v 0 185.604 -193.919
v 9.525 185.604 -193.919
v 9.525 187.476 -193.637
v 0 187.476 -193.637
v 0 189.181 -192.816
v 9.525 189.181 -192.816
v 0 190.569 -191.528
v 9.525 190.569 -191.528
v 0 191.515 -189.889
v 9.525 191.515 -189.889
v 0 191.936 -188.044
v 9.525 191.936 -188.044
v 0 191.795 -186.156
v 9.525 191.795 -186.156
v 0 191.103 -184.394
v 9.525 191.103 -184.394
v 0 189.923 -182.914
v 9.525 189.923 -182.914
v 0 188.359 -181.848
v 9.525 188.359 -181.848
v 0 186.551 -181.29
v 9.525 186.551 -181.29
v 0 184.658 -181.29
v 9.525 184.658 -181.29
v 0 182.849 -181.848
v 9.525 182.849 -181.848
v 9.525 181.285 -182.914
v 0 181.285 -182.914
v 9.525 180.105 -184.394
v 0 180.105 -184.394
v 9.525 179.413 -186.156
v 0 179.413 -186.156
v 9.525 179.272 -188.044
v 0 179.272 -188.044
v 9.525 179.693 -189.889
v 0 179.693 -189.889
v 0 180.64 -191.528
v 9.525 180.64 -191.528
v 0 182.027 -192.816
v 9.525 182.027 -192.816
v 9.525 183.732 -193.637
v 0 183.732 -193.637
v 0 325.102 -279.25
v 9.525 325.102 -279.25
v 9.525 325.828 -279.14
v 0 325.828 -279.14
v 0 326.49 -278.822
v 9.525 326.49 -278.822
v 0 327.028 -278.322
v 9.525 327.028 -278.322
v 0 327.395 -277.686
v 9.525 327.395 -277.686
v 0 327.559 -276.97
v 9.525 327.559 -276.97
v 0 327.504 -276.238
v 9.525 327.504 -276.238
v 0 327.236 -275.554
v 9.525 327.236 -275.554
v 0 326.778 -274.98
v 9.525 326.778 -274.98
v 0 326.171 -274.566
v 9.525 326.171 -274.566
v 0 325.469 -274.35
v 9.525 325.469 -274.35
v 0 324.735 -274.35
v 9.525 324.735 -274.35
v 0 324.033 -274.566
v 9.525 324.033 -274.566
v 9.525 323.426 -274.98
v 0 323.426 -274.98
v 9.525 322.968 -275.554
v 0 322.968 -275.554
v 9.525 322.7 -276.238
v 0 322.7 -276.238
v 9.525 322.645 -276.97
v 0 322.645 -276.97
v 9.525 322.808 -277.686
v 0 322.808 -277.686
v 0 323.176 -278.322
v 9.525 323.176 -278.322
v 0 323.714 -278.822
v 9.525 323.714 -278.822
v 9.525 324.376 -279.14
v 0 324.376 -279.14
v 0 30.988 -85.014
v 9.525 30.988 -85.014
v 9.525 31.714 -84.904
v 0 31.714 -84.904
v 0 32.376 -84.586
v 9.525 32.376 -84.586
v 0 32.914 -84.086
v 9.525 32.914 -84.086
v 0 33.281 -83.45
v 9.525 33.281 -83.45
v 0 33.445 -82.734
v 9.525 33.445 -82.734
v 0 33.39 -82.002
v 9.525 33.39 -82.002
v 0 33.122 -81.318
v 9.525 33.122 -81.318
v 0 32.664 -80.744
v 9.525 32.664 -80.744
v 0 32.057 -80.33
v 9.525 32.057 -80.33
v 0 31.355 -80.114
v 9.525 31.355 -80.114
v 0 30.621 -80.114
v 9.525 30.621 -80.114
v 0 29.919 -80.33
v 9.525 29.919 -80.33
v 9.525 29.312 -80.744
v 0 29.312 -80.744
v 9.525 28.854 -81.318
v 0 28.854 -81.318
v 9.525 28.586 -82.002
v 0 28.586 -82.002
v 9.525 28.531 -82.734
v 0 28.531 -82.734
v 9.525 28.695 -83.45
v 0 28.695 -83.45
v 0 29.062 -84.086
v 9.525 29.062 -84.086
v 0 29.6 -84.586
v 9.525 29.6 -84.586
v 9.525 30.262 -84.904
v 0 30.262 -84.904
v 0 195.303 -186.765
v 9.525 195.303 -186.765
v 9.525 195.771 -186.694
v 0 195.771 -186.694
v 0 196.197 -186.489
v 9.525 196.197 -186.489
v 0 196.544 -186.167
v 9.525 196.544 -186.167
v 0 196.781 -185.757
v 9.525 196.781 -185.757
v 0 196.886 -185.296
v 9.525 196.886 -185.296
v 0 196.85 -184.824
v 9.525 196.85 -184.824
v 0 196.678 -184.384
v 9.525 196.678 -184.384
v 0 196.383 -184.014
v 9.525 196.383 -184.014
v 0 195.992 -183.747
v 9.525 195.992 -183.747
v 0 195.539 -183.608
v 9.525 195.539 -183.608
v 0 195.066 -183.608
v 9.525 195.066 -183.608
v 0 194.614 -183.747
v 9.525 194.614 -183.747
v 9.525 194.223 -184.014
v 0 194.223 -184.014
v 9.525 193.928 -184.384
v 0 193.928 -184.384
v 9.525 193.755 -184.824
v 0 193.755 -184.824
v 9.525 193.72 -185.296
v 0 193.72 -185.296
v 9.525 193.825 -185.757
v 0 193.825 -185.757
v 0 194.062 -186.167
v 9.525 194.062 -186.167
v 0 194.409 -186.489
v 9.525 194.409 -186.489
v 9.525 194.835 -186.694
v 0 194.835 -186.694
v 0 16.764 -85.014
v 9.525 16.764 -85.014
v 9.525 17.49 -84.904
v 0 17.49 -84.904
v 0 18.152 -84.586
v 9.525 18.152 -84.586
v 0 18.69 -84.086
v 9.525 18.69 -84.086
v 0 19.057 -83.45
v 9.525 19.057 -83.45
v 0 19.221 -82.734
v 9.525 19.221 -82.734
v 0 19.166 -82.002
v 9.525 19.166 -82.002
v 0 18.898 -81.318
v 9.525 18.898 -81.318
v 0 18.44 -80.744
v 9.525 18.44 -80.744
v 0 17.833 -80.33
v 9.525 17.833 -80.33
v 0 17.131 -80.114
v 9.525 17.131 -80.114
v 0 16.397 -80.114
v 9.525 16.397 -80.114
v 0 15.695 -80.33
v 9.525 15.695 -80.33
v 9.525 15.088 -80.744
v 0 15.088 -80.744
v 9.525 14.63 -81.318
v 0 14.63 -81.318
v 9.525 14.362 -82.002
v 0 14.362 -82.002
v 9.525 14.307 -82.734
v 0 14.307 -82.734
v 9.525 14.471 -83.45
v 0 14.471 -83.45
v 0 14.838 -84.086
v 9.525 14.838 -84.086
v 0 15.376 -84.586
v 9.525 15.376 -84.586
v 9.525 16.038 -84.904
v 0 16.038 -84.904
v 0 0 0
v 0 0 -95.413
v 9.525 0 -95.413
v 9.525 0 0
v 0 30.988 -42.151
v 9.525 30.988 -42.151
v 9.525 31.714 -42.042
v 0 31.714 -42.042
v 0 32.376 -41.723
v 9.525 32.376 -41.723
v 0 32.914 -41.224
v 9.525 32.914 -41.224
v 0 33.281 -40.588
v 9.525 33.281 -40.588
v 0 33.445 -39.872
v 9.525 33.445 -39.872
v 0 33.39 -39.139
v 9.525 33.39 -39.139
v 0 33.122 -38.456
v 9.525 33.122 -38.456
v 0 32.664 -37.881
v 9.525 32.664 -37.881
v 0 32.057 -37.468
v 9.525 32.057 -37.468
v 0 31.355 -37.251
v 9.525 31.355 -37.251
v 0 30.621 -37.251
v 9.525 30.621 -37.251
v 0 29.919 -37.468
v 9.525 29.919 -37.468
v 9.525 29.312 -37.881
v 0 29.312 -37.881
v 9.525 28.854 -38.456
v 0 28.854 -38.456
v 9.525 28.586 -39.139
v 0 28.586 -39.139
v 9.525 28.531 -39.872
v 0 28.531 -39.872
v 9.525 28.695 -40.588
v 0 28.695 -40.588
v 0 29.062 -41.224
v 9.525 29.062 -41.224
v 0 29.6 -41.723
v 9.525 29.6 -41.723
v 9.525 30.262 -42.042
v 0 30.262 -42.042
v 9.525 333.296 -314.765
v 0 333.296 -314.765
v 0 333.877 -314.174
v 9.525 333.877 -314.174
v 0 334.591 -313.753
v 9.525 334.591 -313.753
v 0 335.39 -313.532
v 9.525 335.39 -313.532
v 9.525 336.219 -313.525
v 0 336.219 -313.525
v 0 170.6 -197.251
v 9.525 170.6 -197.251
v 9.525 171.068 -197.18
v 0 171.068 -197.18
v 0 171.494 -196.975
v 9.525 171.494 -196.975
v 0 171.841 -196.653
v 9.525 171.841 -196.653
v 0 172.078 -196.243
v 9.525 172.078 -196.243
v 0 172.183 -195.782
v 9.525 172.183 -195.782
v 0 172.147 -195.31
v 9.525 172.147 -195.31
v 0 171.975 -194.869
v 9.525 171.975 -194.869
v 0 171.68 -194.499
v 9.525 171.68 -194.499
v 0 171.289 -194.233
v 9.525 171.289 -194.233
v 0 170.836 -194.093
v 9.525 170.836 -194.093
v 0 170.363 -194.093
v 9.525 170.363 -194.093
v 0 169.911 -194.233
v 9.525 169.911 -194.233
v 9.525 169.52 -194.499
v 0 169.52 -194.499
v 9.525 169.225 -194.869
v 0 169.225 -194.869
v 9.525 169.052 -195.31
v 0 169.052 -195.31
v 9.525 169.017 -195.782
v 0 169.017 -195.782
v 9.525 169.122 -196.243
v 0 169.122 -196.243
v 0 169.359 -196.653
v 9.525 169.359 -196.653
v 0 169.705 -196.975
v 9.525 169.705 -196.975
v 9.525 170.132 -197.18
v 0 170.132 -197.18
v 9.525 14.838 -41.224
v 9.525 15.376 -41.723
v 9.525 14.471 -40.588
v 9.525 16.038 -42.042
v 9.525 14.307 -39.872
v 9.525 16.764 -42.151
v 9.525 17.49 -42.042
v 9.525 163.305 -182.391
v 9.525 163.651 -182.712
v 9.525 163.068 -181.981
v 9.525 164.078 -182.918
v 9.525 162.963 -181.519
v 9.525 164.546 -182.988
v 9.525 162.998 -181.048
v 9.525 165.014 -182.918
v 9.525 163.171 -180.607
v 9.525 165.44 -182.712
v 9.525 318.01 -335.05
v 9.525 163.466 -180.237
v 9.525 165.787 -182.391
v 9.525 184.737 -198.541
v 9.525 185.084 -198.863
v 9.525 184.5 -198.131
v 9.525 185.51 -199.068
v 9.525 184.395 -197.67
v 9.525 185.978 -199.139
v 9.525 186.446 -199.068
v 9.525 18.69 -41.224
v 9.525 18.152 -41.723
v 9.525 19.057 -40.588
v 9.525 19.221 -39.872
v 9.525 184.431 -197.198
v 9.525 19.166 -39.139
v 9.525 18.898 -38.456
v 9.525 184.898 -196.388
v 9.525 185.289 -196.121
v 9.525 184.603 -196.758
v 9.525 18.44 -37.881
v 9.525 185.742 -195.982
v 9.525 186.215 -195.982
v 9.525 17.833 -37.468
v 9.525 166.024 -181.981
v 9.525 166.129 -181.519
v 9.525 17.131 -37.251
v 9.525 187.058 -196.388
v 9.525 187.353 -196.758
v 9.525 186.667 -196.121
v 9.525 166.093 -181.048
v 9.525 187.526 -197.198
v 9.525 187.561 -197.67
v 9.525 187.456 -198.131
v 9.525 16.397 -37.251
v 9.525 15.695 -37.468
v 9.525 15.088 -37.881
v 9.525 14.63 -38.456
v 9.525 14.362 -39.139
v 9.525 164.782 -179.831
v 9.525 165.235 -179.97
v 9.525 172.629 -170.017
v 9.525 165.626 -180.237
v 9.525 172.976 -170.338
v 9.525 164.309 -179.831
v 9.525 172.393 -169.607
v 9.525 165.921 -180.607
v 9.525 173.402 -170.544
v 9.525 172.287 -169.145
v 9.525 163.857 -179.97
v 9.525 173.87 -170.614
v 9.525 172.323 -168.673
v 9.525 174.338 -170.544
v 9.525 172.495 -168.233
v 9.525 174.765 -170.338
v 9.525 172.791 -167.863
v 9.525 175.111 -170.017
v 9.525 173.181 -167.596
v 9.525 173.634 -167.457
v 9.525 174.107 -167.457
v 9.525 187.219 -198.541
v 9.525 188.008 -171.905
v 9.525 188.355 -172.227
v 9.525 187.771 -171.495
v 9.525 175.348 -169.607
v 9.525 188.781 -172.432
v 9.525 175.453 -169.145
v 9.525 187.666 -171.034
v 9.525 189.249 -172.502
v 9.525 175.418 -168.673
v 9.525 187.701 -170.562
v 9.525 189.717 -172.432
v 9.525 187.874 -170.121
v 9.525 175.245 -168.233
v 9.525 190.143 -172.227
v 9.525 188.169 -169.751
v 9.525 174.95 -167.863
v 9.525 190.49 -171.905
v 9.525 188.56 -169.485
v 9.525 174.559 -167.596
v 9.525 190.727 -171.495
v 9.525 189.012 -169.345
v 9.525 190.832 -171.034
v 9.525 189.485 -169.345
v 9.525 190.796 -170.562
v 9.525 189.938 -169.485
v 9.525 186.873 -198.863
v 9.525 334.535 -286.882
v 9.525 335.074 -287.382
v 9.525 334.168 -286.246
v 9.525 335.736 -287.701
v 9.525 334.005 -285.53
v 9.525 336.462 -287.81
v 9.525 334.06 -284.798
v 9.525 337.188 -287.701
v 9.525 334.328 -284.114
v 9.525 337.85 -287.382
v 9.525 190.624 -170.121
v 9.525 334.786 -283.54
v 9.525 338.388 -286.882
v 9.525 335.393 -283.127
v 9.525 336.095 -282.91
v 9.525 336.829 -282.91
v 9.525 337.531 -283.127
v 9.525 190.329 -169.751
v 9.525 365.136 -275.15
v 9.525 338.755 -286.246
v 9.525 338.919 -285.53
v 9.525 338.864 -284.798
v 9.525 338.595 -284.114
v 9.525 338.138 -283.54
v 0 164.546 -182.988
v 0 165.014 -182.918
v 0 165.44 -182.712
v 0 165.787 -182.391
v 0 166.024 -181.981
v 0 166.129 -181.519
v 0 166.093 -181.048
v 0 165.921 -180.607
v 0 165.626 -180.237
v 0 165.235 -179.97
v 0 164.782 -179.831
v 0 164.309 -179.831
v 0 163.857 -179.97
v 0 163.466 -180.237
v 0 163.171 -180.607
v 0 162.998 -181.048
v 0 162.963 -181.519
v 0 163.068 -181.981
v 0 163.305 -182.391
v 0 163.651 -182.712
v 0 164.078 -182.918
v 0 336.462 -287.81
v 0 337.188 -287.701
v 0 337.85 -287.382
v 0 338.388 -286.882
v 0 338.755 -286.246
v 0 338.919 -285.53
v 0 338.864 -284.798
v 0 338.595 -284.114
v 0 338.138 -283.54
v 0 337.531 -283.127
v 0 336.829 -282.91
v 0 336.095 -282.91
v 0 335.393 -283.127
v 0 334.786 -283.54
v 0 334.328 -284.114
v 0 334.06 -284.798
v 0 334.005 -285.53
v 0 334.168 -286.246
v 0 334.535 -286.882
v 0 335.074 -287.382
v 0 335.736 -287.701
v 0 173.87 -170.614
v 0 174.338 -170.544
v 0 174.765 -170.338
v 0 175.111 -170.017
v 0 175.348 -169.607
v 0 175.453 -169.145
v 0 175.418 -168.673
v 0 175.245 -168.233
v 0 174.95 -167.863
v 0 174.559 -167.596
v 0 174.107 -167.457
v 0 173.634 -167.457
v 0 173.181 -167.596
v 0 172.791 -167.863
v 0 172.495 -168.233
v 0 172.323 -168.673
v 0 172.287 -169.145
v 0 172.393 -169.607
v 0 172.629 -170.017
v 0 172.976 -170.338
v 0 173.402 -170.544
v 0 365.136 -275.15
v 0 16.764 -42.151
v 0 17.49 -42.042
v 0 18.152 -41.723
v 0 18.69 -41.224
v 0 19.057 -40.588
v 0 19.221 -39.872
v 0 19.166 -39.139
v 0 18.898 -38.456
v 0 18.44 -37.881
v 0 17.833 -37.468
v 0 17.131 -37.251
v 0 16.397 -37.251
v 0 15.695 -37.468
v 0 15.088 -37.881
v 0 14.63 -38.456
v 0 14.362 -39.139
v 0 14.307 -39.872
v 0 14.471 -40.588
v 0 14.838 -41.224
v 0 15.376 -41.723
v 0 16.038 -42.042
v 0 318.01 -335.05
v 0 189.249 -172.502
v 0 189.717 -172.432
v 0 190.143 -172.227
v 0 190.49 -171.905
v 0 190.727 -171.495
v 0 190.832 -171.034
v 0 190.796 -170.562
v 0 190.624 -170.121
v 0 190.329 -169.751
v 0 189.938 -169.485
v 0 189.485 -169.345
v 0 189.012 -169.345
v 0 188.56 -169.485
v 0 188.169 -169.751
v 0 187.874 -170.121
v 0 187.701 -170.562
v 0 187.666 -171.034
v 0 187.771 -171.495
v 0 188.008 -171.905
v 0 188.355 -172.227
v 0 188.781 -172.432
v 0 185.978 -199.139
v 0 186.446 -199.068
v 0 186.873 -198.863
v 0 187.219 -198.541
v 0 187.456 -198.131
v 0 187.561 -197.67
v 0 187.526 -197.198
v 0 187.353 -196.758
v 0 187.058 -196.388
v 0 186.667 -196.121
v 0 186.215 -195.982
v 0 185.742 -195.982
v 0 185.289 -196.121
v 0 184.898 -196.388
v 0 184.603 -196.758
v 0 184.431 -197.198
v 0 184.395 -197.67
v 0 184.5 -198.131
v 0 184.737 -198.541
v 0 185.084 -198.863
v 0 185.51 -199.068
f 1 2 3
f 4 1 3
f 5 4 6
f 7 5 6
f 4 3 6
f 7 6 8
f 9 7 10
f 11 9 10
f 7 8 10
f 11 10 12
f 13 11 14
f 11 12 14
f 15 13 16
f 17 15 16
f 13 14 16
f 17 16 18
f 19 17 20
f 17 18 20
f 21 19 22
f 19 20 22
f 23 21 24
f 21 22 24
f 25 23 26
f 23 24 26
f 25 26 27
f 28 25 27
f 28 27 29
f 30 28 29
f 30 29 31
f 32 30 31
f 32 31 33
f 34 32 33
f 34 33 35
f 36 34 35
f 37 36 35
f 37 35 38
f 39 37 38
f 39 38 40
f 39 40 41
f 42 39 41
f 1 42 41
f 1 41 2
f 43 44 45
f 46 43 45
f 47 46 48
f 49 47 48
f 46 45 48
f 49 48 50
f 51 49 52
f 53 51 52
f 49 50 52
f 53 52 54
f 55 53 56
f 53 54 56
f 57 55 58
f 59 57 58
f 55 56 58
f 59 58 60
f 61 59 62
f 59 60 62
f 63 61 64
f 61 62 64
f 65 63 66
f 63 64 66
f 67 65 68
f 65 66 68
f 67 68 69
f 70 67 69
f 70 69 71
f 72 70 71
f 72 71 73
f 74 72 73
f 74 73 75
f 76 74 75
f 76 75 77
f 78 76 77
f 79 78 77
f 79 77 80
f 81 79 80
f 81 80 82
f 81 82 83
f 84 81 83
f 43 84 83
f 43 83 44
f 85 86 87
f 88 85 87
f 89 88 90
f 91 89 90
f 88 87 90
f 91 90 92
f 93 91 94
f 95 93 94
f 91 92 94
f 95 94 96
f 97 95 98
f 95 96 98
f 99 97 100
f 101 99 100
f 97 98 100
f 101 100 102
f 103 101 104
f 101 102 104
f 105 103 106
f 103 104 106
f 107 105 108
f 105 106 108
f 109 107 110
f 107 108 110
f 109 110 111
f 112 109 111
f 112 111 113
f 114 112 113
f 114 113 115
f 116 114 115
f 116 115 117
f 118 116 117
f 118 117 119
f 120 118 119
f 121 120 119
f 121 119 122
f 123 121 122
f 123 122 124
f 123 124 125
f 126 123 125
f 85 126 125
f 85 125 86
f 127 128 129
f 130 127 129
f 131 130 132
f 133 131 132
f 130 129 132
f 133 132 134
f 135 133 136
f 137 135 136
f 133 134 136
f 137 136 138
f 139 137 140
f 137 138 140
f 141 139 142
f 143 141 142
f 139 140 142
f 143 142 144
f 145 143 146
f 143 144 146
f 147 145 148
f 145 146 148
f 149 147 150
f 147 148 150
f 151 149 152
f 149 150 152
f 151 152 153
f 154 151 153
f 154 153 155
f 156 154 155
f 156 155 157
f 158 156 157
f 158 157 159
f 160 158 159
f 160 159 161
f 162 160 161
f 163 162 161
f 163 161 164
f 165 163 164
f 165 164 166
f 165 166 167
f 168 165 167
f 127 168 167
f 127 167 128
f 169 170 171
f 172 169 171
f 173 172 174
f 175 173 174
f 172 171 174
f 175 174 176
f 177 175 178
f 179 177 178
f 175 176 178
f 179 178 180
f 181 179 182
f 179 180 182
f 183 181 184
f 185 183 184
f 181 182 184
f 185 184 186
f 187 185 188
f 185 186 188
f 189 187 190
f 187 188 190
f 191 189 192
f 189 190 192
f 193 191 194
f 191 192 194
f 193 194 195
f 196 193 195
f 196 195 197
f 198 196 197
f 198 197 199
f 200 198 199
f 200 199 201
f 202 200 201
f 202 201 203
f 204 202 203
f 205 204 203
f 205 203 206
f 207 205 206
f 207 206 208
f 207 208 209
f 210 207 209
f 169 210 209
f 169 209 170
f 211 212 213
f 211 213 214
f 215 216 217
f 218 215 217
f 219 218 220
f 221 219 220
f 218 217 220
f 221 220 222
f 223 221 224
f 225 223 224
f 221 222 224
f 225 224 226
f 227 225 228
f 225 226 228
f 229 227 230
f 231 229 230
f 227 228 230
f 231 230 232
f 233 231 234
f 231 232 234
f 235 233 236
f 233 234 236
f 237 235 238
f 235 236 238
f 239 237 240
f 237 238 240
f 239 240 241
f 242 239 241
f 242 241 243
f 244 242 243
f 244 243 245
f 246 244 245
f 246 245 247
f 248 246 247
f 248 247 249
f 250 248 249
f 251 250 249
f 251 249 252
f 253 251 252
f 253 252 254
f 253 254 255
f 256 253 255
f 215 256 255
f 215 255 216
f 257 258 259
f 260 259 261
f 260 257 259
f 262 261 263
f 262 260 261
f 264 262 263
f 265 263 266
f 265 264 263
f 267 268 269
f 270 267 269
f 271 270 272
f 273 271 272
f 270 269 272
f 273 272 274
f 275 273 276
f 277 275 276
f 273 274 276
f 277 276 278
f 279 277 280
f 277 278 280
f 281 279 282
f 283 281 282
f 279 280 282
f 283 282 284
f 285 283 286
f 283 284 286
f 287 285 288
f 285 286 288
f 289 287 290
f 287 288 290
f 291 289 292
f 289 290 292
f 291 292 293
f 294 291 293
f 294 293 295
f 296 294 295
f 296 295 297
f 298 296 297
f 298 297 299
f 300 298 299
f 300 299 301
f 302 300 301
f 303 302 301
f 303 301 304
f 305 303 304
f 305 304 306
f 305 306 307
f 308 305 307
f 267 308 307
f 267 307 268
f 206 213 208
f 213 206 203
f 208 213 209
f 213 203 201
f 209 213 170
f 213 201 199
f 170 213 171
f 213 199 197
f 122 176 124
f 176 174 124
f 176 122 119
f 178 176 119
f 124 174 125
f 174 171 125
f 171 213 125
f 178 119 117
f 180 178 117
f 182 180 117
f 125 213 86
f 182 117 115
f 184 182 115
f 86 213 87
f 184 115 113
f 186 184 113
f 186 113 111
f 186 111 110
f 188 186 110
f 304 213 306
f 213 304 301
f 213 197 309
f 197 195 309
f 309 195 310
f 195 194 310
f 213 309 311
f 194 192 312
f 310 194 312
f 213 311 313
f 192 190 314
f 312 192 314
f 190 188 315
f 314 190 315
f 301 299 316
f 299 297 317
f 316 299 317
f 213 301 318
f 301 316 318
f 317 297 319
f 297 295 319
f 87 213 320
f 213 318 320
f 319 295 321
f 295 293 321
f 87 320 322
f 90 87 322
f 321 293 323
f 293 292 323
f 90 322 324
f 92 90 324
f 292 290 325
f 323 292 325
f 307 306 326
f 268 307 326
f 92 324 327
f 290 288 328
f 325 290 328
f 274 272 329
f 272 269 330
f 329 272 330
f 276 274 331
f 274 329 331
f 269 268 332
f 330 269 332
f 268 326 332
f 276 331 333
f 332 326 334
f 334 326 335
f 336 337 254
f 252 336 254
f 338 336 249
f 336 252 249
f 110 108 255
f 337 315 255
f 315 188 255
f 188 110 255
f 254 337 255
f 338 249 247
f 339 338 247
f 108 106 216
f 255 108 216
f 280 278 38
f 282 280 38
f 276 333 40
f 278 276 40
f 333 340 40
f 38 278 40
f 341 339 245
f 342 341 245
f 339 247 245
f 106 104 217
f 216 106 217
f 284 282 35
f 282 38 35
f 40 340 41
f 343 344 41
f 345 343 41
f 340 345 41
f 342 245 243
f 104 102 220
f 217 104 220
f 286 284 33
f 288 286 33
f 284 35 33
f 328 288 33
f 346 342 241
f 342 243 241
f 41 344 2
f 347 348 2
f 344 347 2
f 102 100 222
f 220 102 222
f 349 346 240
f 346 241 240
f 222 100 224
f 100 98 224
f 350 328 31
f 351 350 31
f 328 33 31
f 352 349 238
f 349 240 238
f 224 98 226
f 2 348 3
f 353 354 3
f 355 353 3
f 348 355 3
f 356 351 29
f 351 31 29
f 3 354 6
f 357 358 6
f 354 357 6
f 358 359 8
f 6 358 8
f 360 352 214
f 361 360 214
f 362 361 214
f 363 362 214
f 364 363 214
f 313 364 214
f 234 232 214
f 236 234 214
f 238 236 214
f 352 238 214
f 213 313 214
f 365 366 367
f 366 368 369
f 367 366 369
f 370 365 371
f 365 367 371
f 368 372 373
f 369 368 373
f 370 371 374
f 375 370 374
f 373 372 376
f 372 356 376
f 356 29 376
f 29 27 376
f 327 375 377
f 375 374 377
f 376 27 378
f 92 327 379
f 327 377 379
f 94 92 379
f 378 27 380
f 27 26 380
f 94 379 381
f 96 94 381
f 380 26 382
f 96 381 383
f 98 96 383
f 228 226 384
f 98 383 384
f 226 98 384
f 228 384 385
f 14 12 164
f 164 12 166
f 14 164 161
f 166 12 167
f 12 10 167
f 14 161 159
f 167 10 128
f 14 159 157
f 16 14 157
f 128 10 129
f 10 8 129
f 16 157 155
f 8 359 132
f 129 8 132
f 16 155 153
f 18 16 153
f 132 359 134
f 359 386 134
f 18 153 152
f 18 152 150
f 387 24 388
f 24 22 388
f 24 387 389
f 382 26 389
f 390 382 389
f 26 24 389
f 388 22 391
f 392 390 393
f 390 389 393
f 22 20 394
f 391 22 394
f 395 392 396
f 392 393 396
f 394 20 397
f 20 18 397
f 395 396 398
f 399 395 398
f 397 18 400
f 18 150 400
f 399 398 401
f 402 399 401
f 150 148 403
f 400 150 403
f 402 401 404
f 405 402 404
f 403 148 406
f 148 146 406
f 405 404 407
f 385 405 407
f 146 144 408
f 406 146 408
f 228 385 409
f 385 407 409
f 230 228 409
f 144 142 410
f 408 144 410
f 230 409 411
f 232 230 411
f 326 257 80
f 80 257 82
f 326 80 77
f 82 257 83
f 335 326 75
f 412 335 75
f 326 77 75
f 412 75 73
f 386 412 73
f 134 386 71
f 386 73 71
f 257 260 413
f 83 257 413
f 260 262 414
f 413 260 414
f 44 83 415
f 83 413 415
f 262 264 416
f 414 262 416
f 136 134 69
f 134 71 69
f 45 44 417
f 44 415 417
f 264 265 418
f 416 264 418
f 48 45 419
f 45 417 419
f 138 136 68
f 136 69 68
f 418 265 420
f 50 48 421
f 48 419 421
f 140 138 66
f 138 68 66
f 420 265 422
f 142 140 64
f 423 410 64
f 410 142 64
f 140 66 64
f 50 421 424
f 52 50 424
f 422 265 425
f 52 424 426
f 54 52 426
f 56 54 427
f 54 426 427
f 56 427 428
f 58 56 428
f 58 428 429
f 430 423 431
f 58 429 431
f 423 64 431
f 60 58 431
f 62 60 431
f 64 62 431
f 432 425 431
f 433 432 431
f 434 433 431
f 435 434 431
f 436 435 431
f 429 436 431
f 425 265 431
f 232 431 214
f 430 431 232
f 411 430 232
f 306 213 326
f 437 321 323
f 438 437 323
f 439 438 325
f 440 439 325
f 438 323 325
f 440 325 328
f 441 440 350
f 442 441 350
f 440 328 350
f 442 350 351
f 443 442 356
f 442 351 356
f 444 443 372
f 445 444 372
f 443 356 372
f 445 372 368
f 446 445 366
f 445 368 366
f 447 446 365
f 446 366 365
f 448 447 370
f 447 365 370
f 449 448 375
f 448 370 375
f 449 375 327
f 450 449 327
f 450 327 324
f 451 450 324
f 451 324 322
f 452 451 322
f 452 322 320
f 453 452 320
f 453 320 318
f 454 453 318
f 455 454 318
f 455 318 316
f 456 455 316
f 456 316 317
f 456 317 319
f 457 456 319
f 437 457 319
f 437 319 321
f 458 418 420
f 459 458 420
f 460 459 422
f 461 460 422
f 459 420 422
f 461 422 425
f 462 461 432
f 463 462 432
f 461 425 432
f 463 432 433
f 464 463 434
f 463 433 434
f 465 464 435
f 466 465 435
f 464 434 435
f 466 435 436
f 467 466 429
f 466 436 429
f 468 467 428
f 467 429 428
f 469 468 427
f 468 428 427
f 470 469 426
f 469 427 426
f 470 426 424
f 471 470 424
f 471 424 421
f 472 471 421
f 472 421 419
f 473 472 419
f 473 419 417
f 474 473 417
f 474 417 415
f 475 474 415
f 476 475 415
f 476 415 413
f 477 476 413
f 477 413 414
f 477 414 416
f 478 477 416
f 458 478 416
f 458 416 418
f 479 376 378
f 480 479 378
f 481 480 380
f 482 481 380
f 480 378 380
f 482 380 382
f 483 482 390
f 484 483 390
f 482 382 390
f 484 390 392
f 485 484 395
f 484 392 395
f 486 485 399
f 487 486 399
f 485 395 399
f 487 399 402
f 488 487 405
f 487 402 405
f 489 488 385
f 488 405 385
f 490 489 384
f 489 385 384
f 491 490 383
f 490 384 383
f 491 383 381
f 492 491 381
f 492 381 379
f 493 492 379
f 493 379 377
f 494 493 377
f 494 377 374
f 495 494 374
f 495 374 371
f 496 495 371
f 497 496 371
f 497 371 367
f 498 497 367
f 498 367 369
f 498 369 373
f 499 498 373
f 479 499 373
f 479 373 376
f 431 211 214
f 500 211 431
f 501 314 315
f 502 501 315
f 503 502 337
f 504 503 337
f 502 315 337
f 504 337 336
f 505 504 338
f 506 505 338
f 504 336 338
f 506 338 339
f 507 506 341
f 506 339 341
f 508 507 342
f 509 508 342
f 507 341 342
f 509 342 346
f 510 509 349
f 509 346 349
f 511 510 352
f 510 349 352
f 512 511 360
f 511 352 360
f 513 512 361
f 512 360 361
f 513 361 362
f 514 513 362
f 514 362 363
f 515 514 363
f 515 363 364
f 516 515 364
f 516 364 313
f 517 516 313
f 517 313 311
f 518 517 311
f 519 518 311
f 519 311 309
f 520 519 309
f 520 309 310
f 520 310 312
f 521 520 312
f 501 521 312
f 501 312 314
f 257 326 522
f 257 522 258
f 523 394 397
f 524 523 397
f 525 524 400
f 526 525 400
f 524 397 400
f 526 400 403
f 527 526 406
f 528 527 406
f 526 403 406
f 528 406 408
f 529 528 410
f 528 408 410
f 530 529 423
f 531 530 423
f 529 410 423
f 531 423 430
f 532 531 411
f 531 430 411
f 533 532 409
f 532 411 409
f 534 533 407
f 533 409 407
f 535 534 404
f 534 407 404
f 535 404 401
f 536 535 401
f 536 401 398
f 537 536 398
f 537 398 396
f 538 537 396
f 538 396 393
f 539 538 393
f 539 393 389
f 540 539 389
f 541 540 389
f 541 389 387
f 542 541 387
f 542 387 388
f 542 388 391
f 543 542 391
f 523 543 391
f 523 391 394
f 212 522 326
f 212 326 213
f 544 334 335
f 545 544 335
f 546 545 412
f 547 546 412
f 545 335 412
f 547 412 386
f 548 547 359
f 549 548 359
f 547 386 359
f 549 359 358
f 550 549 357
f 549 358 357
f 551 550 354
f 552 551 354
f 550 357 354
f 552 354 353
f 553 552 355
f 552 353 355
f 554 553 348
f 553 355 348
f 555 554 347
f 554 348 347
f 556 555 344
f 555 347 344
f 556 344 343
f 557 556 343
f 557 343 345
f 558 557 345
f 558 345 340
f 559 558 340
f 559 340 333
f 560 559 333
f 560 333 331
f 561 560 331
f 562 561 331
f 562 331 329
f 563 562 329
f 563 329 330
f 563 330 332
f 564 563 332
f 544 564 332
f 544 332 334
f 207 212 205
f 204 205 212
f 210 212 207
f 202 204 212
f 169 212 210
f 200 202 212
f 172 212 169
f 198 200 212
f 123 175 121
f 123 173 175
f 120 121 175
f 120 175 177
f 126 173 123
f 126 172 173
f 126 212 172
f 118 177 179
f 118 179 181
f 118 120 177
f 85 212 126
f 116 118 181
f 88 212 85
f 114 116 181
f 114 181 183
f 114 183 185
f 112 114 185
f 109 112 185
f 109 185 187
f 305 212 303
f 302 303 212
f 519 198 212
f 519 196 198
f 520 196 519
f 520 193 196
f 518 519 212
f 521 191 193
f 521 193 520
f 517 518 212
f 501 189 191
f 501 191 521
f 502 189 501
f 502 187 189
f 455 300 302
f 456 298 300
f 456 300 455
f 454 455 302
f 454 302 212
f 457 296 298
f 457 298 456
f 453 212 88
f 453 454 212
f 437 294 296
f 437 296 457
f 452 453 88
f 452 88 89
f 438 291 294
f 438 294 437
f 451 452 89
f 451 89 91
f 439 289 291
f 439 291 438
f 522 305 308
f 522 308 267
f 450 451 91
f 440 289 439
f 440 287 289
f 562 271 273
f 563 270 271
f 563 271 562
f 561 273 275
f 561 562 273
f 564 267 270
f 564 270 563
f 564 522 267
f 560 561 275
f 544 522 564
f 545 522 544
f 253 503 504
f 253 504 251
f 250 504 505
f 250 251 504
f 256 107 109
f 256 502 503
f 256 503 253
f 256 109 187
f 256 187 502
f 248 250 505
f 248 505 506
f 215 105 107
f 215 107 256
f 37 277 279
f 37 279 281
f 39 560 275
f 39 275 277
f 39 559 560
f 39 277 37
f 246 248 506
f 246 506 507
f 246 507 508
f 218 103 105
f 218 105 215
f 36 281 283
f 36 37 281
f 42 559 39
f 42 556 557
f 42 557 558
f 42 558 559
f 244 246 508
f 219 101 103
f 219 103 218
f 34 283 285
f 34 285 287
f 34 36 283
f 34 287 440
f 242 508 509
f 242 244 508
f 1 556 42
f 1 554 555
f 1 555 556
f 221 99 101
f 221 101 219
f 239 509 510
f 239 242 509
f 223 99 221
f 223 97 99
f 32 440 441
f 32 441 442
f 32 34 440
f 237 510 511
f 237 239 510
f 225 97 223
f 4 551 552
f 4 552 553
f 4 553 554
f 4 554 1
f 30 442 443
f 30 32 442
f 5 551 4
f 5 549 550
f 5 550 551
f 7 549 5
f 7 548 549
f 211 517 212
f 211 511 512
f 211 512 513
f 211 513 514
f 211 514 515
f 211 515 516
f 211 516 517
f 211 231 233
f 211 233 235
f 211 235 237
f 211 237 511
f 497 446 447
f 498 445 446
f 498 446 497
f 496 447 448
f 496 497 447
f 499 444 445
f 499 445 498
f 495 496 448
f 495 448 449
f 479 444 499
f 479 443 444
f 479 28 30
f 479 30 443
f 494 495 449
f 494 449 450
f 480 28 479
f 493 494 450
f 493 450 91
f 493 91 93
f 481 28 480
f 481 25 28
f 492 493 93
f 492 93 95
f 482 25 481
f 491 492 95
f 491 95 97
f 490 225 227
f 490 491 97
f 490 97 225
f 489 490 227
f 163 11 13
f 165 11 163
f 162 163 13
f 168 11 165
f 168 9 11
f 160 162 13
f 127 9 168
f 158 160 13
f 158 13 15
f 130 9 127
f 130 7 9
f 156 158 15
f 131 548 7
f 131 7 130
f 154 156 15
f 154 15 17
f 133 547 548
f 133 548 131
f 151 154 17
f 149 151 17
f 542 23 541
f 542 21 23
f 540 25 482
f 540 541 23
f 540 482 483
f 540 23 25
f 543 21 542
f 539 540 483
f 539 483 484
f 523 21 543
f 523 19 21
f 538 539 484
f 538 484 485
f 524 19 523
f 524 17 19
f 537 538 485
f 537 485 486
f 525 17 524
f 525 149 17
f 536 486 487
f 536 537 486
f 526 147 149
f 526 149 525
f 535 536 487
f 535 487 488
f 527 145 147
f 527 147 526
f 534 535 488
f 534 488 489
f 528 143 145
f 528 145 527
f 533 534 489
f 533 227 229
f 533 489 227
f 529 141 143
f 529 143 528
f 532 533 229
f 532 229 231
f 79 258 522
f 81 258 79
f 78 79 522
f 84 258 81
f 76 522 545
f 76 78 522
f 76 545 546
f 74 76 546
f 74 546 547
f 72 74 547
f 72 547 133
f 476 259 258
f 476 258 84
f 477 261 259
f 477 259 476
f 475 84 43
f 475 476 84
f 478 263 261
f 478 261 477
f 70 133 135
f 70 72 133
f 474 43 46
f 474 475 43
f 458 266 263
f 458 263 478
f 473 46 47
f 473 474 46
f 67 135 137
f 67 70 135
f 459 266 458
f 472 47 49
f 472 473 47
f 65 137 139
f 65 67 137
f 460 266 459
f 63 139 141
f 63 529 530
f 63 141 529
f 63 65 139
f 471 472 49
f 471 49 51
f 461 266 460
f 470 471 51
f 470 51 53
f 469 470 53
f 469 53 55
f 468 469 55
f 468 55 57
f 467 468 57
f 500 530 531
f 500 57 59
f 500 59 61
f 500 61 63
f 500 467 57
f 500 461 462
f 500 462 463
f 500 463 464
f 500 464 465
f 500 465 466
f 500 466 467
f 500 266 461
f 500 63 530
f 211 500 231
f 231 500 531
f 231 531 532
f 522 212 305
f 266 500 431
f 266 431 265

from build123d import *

# Parameters (mm, degrees)
BOSS_EXTRUDE1_DEPTH = 9.525
CUT_EXTRUDE1_DEPTH  = 10.525
SKETCH3_R           = 6.35
SKETCH3_R_2         = 1.5875
CUT_EXTRUDE2_DEPTH  = 10.525
SKETCH4_R           = 2.4638
CUT_EXTRUDE3_DEPTH  = 10.525


with BuildPart() as part:
    # Sketch1 → Boss-Extrude1 (new body)
    with BuildSketch(Plane(origin=(0, 0, 0), x_dir=(0, 0, -1), z_dir=(1, 0, 0))):
        Polygon((0, 0), (275.149828585, 365.136155194), (336.005854451, 319.277850429), (95.412737152, 0), align=None)
    extrude(amount=BOSS_EXTRUDE1_DEPTH)

    # Sketch2 → Cut-Extrude1 (cut, through all)
    with BuildSketch(Plane(origin=(9.525, 0, 0), x_dir=(0, 0, -1), z_dir=(1, 0, 0))):
        with BuildLine():
            Line((335.050473101, 318.010016557), (314.765131146, 333.296118145))
            ThreePointArc((314.765131146, 333.296118145), (313.753290935, 334.591214557), (313.524559813, 336.218721055))
            Line((313.524559813, 336.218721055), (336.005854451, 319.277850429))
            Line((336.005854451, 319.277850429), (335.050473101, 318.010016557))
        make_face()
    extrude(amount=-CUT_EXTRUDE1_DEPTH, mode=Mode.SUBTRACT)

    # Sketch3 → Cut-Extrude2 (cut, through all)
    with BuildSketch(Plane(origin=(9.525, 0, 0), x_dir=(0, 0, -1), z_dir=(1, 0, 0))):
        with Locations((187.569137258, 185.604162917)):
            Circle(SKETCH3_R)
        with Locations((195.663087406, 170.599745201)):
            Circle(SKETCH3_R_2)
        with Locations((181.400785207, 164.545757096)):
            Circle(SKETCH3_R_2)
        with Locations((169.026726614, 173.870279065)):
            Circle(SKETCH3_R_2)
        with Locations((170.914970221, 189.248789139)):
            Circle(SKETCH3_R_2)
        with Locations((185.17727242, 195.302777243)):
            Circle(SKETCH3_R_2)
        with Locations((197.551331013, 185.978255275)):
            Circle(SKETCH3_R_2)
    extrude(amount=-CUT_EXTRUDE2_DEPTH, mode=Mode.SUBTRACT)

    # Sketch4 → Cut-Extrude3 (cut, through all)
    with BuildSketch(Plane(origin=(9.525, 0, 0), x_dir=(0, 0, -1), z_dir=(1, 0, 0))):
        with Locations((285.346343492, 336.461727915)):
            Circle(SKETCH4_R)
        with Locations((276.786126603, 325.10193642)):
            Circle(SKETCH4_R)
        with Locations((39.6875, 30.988)):
            Circle(SKETCH4_R)
        with Locations((39.6875, 16.764)):
            Circle(SKETCH4_R)
        with Locations((82.55, 30.988)):
            Circle(SKETCH4_R)
        with Locations((82.55, 16.764)):
            Circle(SKETCH4_R)
    extrude(amount=-CUT_EXTRUDE3_DEPTH, mode=Mode.SUBTRACT)


solid = part.part
